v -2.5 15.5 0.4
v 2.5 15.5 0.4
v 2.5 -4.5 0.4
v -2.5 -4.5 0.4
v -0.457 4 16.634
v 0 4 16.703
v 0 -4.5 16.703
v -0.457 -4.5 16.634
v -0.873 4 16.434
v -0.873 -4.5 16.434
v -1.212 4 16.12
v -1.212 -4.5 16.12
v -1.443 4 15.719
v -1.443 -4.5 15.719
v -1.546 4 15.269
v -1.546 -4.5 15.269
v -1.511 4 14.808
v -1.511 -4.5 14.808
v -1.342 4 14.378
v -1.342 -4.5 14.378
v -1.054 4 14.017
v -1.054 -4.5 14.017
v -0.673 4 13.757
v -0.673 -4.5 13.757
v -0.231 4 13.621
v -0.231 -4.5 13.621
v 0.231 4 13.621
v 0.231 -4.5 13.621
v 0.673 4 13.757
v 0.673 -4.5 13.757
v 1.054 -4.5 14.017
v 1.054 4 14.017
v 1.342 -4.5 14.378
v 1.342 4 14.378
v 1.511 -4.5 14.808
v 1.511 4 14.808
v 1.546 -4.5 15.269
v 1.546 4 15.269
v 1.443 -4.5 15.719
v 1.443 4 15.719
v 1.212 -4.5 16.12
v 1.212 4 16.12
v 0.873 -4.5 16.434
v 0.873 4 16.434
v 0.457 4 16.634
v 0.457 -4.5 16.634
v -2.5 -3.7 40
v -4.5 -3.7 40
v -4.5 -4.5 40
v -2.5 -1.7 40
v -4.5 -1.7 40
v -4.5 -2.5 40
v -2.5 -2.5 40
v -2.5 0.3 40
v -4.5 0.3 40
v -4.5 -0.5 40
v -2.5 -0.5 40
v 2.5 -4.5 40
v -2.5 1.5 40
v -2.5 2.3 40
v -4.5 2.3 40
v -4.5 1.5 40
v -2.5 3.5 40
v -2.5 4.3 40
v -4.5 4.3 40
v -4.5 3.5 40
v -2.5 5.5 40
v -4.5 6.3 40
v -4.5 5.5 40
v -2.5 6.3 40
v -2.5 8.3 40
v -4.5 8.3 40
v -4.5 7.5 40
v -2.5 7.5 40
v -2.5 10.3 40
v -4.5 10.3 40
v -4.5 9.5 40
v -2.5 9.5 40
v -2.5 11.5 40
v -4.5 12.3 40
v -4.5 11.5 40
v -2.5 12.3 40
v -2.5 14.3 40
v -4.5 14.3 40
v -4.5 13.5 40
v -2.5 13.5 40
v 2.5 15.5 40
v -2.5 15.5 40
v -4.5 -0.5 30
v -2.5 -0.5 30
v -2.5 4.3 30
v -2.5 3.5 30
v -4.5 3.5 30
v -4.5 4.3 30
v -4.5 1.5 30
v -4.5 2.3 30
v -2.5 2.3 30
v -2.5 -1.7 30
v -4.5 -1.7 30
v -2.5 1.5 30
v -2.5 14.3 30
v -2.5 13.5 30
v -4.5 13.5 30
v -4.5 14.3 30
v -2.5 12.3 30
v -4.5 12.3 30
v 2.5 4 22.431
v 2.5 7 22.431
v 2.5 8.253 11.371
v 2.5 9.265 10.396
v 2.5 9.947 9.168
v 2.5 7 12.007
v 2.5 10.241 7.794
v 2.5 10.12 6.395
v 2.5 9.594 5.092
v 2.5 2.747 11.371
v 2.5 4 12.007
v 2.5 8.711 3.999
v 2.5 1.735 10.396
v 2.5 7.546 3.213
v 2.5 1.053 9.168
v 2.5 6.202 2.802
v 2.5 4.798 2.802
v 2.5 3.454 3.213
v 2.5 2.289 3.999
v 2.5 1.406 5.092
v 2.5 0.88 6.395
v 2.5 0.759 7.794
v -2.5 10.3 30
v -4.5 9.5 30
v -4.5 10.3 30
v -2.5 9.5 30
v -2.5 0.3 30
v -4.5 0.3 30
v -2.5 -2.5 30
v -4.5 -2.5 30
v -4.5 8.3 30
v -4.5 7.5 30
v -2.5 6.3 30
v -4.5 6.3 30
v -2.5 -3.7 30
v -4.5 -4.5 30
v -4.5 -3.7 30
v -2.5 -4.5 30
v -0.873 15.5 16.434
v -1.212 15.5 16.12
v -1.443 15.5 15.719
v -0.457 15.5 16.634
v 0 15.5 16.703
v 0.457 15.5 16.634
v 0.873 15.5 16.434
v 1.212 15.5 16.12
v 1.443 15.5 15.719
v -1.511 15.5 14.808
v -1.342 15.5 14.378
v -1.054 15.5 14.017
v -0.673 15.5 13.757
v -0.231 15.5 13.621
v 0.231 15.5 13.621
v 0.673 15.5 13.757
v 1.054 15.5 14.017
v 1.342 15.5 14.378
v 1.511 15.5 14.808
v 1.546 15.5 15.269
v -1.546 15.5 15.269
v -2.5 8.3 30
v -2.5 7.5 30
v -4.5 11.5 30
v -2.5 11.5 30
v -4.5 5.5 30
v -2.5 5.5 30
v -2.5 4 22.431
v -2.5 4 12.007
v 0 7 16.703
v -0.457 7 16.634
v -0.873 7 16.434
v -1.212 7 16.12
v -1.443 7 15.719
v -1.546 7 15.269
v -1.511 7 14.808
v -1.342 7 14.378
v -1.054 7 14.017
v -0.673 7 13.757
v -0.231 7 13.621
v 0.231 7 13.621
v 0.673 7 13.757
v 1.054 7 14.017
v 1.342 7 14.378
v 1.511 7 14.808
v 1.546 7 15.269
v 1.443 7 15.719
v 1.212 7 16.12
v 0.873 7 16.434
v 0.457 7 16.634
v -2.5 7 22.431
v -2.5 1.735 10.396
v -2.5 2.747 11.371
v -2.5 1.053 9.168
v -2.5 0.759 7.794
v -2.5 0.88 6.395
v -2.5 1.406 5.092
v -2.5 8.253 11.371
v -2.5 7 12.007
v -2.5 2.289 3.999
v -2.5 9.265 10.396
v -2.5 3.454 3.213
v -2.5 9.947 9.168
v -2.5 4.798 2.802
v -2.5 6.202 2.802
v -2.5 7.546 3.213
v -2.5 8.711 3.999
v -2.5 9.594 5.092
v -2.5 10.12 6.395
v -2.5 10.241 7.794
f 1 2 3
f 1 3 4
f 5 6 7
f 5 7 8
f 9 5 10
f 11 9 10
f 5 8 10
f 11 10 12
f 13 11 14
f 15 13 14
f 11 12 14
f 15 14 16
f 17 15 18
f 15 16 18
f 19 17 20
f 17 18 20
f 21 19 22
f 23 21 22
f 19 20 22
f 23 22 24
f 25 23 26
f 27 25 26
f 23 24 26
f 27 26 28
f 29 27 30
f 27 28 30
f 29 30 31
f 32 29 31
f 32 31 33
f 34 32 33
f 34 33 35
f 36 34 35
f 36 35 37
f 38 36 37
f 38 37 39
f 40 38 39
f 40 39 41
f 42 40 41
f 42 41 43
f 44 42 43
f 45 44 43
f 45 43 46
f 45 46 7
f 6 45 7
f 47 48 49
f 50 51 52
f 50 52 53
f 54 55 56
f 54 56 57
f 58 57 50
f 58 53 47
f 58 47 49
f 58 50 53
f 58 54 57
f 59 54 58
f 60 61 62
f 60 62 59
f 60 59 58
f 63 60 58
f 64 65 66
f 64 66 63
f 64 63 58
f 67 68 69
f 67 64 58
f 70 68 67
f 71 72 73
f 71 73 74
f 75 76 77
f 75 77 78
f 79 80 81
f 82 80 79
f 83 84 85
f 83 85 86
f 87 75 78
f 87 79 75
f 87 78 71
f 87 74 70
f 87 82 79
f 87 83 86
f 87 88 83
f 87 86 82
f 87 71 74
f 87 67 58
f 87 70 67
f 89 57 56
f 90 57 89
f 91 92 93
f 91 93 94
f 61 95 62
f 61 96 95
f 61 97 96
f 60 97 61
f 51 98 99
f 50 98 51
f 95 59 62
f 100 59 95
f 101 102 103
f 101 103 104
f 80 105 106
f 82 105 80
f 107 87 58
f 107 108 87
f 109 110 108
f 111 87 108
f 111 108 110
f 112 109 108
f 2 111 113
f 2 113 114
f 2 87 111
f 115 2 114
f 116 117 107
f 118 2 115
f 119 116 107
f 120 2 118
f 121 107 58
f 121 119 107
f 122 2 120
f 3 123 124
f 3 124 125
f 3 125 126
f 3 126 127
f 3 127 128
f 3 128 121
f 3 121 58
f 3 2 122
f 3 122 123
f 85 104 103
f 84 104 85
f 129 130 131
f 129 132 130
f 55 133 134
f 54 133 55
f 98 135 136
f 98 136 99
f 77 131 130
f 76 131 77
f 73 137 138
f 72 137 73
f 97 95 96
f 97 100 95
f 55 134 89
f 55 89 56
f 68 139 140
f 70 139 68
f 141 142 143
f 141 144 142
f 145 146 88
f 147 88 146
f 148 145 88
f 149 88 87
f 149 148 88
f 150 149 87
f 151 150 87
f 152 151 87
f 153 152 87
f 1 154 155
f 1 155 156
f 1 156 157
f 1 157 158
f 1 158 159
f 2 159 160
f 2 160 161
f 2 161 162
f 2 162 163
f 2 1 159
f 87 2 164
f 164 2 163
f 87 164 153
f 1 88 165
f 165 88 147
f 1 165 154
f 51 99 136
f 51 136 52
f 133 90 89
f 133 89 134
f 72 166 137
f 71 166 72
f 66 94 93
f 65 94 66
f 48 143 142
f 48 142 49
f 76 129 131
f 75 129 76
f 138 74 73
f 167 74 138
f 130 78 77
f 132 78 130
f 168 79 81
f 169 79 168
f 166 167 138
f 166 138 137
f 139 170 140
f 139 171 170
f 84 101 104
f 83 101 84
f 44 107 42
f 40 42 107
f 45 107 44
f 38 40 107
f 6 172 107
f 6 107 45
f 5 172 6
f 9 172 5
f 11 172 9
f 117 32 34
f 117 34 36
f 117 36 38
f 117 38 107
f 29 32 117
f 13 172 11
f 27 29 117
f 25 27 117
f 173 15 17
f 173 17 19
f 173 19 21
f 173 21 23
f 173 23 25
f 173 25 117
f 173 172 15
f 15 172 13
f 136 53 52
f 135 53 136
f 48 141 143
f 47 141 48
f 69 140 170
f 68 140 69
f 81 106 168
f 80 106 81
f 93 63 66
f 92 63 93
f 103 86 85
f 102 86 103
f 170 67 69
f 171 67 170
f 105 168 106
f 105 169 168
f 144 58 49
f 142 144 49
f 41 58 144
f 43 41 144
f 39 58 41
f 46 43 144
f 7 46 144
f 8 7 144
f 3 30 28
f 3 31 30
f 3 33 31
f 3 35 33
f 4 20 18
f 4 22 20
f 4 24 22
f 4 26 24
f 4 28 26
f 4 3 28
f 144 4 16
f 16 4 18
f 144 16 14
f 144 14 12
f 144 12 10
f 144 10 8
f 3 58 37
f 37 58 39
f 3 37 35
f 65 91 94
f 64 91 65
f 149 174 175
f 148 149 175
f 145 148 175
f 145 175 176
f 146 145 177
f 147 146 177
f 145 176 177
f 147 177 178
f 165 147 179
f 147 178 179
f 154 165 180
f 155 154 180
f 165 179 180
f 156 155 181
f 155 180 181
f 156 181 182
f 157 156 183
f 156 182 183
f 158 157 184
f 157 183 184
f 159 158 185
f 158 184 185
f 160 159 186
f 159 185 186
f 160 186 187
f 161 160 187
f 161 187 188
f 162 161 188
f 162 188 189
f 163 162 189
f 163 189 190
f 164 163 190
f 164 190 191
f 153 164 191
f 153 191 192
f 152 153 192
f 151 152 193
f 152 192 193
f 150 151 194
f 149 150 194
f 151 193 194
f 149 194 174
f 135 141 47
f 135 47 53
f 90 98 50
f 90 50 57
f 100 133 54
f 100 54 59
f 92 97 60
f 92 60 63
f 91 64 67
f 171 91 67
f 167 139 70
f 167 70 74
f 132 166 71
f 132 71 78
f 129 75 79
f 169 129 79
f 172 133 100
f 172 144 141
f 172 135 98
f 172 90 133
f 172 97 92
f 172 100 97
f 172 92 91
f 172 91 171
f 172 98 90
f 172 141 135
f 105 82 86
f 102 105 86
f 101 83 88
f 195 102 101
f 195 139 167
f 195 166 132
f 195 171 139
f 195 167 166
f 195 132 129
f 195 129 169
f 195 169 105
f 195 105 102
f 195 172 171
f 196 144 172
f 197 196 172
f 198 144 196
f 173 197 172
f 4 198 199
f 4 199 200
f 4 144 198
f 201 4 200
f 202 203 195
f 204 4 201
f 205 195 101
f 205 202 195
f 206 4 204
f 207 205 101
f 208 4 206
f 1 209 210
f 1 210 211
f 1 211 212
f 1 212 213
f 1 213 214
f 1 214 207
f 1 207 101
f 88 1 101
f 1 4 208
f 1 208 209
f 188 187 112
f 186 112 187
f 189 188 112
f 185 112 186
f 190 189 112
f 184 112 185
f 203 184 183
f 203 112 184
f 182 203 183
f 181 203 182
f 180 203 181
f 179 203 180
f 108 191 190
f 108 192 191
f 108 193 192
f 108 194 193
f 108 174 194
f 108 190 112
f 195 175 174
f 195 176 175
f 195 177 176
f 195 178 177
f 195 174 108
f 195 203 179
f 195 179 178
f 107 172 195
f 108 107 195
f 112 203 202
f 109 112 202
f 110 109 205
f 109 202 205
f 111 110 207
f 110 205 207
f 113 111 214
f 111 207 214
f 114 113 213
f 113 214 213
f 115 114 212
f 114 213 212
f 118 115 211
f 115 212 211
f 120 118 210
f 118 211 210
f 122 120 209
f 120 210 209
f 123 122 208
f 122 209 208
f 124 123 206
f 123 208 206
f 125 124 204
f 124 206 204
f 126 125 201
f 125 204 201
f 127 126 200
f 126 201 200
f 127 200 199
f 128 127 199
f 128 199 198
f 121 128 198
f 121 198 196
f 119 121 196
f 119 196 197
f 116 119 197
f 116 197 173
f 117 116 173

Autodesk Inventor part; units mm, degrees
ref_plane "YZ Plane" through (0, 0, 0) normal (1, 0, 0) x (0, 1, 0)
ref_plane "XZ Plane" through (0, 0, 0) normal (0, 1, 0) x (-1, 0, 0)
ref_plane "XY Plane" through (0, 0, 0) normal (0, 0, 1) x (1, 0, 0)
sketch "Sketch1" plane through (0, 0, 0) normal (0, 0, 1) x (1, 0, 0)
  line L0 (-2.5, 15.5) -> (2.5, 15.5)
  line L1 (2.5, 15.5) -> (2.5, -4.5)
  line L2 (2.5, -4.5) -> (-2.5, -4.5)
  line L3 (-2.5, -4.5) -> (-2.5, 15.5)
  point P0 (0, 0)
  dimension "d0" = 5
  dimension "d1" = 20
extrude "Extrusion1" add sketch "Sketch1" along normal blind 40
sketch "Sketch3" plane through (-2.5, -4.5, 0) normal (-1, 0, 0) x (0, 0, 1)
  line L0 (0, 0) -> (0, 20) projected
  line L1 (0, 10) -> (2.5, 10)
  line L2 (2.5, 10) -> (7.5, 10)
  circle A0 centre (7.5, 10) radius 4.75
  point P0 (0, 4.5)
  dimension "d7" = 2.5
  dimension "d38" = 5
  dimension "d39" = 9.5
extrude "Extrusion2" cut sketch "Sketch3" against normal blind 8
sketch "Sketch4" plane through (-2.5, -4.5, 0) normal (-1, 0, 0) x (0, 0, 1)
  line L0 (40, 0) -> (40, 20) projected
  line L1 (40, 0) -> (30, 0)
  line L2 (30, 0) -> (30, 0.8)
  line L3 (30, 0.8) -> (40, 0.8)
  line L4 (40, 0.8) -> (40, 0)
  line L5 (40, 0.8) -> (40, 2)
  line L6 (40, 2) -> (30, 2)
  line L7 (30, 2) -> (30, 2.8)
  line L8 (30, 2.8) -> (40, 2.8)
  line L9 (40, 2.8) -> (40, 2)
  line L10 (40, 2.8) -> (40, 4)
  line L11 (40, 4) -> (30, 4)
  line L12 (30, 4) -> (30, 4.8)
  line L13 (30, 4.8) -> (40, 4.8)
  line L14 (40, 4.8) -> (40, 4)
  line L15 (40, 4.8) -> (40, 6)
  line L16 (40, 6) -> (30, 6)
  line L17 (30, 6) -> (30, 6.8)
  line L18 (30, 6.8) -> (40, 6.8)
  line L19 (40, 6.8) -> (40, 6)
  line L20 (40, 6.8) -> (40, 8)
  line L21 (40, 8) -> (30, 8)
  line L22 (30, 8) -> (30, 8.8)
  line L23 (30, 8.8) -> (40, 8.8)
  line L24 (40, 8.8) -> (40, 8)
  line L25 (40, 8.8) -> (40, 10)
  line L26 (40, 10) -> (30, 10)
  line L27 (30, 10) -> (30, 10.8)
  line L28 (30, 10.8) -> (40, 10.8)
  line L29 (40, 10.8) -> (40, 10)
  line L30 (40, 10.8) -> (40, 12)
  line L31 (40, 12) -> (30, 12)
  line L32 (30, 12) -> (30, 12.8)
  line L33 (30, 12.8) -> (40, 12.8)
  line L34 (40, 12.8) -> (40, 12)
  line L35 (40, 12.8) -> (40, 14)
  line L36 (40, 14) -> (30, 14)
  line L37 (30, 14) -> (30, 14.8)
  line L38 (30, 14.8) -> (40, 14.8)
  line L39 (40, 14.8) -> (40, 14)
  line L40 (40, 14.8) -> (40, 16)
  line L41 (40, 16) -> (30, 16)
  line L42 (30, 16) -> (30, 16.8)
  line L43 (30, 16.8) -> (40, 16.8)
  line L44 (40, 16.8) -> (40, 16)
  line L45 (40, 16.8) -> (40, 18)
  line L46 (40, 18) -> (30, 18)
  line L47 (30, 18) -> (30, 18.8)
  line L48 (30, 18.8) -> (40, 18.8)
  line L49 (40, 18.8) -> (40, 18)
  point P0 (0, 4.5)
  dimension "d12" = 10
  dimension "d13" = 0.8
  dimension "d14" = 1.2
  dimension "d15" = 0.8
  dimension "d16" = 1.2
  dimension "d17" = 0.8
  dimension "d18" = 1.2
  dimension "d19" = 0.8
  dimension "d20" = 1.2
  dimension "d21" = 0.8
  dimension "d22" = 1.2
  dimension "d29" = 0.8
  dimension "d30" = 1.2
  dimension "d31" = 0.8
  dimension "d32" = 1.2
  dimension "d33" = 0.8
  dimension "d34" = 1.2
  dimension "d35" = 0.8
  dimension "d36" = 1.2
  dimension "d37" = 0.8
extrude "Extrusion3" add sketch "Sketch4" along normal blind 2
sketch "Sketch5" plane through (-2.5, -4.5, 0) normal (-1, 0, 0) x (0, 0, 1)
  circle A0 centre (7.5, 10) radius 4.75 projected
  line L0 (12.4308, 11.5) -> (18, 11.5)
  line L1 (22.4308, 8.5) -> (22.4308, 11.5)
  line L2 (22.4308, 11.5) -> (18, 11.5)
  line L3 (22.4308, 8.5) -> (11.2154, 8.5)
  line L4 (11.2154, 8.5) -> (11.2154, 11.5)
  line L5 (11.2154, 11.5) -> (12.4308, 11.5)
  point P0 (0, 4.5)
extrude "Extrusion4" cut sketch "Sketch5" against normal blind 40 contours A0 L3 L4 L5 | A0 L5 L0 L2 L1 L3 picked at (11.5603, 10)
sketch "Sketch6" plane through (-2.5, 15.5, 0) normal (0, 1, 0) x (1, 0, 0)
  line L0 (0, 0) -> (0, -40) projected
  line L1 (0, -15.1532) -> (2.5, -15.1532)
  point P0 (2.5, 0)
hole "Hole1" at (0, 15.5, 15.1532) direction (0, -1, 0) diameter 3.1 depth 49.5
sketch "Sketch7" plane through (0, 0, 0) normal (0, 0, -1) x (-1, 0, 0)
  line L0 (-2.5, -4.5) -> (-2.5, 15.5) projected
  line L1 (-2.5, 15.5) -> (2.5392, 15.5)
  line L2 (2.5392, 15.5) -> (2.5392, -4.5)
  line L3 (2.5392, -4.5) -> (-2.5, -4.5)
  line L4 (-2.5, -4.5) -> (-2.5, 15.5)
  point P0 (0, 0)
extrude "Extrusion5" cut sketch "Sketch7" against normal blind 0.4
properties part number "teethset"
